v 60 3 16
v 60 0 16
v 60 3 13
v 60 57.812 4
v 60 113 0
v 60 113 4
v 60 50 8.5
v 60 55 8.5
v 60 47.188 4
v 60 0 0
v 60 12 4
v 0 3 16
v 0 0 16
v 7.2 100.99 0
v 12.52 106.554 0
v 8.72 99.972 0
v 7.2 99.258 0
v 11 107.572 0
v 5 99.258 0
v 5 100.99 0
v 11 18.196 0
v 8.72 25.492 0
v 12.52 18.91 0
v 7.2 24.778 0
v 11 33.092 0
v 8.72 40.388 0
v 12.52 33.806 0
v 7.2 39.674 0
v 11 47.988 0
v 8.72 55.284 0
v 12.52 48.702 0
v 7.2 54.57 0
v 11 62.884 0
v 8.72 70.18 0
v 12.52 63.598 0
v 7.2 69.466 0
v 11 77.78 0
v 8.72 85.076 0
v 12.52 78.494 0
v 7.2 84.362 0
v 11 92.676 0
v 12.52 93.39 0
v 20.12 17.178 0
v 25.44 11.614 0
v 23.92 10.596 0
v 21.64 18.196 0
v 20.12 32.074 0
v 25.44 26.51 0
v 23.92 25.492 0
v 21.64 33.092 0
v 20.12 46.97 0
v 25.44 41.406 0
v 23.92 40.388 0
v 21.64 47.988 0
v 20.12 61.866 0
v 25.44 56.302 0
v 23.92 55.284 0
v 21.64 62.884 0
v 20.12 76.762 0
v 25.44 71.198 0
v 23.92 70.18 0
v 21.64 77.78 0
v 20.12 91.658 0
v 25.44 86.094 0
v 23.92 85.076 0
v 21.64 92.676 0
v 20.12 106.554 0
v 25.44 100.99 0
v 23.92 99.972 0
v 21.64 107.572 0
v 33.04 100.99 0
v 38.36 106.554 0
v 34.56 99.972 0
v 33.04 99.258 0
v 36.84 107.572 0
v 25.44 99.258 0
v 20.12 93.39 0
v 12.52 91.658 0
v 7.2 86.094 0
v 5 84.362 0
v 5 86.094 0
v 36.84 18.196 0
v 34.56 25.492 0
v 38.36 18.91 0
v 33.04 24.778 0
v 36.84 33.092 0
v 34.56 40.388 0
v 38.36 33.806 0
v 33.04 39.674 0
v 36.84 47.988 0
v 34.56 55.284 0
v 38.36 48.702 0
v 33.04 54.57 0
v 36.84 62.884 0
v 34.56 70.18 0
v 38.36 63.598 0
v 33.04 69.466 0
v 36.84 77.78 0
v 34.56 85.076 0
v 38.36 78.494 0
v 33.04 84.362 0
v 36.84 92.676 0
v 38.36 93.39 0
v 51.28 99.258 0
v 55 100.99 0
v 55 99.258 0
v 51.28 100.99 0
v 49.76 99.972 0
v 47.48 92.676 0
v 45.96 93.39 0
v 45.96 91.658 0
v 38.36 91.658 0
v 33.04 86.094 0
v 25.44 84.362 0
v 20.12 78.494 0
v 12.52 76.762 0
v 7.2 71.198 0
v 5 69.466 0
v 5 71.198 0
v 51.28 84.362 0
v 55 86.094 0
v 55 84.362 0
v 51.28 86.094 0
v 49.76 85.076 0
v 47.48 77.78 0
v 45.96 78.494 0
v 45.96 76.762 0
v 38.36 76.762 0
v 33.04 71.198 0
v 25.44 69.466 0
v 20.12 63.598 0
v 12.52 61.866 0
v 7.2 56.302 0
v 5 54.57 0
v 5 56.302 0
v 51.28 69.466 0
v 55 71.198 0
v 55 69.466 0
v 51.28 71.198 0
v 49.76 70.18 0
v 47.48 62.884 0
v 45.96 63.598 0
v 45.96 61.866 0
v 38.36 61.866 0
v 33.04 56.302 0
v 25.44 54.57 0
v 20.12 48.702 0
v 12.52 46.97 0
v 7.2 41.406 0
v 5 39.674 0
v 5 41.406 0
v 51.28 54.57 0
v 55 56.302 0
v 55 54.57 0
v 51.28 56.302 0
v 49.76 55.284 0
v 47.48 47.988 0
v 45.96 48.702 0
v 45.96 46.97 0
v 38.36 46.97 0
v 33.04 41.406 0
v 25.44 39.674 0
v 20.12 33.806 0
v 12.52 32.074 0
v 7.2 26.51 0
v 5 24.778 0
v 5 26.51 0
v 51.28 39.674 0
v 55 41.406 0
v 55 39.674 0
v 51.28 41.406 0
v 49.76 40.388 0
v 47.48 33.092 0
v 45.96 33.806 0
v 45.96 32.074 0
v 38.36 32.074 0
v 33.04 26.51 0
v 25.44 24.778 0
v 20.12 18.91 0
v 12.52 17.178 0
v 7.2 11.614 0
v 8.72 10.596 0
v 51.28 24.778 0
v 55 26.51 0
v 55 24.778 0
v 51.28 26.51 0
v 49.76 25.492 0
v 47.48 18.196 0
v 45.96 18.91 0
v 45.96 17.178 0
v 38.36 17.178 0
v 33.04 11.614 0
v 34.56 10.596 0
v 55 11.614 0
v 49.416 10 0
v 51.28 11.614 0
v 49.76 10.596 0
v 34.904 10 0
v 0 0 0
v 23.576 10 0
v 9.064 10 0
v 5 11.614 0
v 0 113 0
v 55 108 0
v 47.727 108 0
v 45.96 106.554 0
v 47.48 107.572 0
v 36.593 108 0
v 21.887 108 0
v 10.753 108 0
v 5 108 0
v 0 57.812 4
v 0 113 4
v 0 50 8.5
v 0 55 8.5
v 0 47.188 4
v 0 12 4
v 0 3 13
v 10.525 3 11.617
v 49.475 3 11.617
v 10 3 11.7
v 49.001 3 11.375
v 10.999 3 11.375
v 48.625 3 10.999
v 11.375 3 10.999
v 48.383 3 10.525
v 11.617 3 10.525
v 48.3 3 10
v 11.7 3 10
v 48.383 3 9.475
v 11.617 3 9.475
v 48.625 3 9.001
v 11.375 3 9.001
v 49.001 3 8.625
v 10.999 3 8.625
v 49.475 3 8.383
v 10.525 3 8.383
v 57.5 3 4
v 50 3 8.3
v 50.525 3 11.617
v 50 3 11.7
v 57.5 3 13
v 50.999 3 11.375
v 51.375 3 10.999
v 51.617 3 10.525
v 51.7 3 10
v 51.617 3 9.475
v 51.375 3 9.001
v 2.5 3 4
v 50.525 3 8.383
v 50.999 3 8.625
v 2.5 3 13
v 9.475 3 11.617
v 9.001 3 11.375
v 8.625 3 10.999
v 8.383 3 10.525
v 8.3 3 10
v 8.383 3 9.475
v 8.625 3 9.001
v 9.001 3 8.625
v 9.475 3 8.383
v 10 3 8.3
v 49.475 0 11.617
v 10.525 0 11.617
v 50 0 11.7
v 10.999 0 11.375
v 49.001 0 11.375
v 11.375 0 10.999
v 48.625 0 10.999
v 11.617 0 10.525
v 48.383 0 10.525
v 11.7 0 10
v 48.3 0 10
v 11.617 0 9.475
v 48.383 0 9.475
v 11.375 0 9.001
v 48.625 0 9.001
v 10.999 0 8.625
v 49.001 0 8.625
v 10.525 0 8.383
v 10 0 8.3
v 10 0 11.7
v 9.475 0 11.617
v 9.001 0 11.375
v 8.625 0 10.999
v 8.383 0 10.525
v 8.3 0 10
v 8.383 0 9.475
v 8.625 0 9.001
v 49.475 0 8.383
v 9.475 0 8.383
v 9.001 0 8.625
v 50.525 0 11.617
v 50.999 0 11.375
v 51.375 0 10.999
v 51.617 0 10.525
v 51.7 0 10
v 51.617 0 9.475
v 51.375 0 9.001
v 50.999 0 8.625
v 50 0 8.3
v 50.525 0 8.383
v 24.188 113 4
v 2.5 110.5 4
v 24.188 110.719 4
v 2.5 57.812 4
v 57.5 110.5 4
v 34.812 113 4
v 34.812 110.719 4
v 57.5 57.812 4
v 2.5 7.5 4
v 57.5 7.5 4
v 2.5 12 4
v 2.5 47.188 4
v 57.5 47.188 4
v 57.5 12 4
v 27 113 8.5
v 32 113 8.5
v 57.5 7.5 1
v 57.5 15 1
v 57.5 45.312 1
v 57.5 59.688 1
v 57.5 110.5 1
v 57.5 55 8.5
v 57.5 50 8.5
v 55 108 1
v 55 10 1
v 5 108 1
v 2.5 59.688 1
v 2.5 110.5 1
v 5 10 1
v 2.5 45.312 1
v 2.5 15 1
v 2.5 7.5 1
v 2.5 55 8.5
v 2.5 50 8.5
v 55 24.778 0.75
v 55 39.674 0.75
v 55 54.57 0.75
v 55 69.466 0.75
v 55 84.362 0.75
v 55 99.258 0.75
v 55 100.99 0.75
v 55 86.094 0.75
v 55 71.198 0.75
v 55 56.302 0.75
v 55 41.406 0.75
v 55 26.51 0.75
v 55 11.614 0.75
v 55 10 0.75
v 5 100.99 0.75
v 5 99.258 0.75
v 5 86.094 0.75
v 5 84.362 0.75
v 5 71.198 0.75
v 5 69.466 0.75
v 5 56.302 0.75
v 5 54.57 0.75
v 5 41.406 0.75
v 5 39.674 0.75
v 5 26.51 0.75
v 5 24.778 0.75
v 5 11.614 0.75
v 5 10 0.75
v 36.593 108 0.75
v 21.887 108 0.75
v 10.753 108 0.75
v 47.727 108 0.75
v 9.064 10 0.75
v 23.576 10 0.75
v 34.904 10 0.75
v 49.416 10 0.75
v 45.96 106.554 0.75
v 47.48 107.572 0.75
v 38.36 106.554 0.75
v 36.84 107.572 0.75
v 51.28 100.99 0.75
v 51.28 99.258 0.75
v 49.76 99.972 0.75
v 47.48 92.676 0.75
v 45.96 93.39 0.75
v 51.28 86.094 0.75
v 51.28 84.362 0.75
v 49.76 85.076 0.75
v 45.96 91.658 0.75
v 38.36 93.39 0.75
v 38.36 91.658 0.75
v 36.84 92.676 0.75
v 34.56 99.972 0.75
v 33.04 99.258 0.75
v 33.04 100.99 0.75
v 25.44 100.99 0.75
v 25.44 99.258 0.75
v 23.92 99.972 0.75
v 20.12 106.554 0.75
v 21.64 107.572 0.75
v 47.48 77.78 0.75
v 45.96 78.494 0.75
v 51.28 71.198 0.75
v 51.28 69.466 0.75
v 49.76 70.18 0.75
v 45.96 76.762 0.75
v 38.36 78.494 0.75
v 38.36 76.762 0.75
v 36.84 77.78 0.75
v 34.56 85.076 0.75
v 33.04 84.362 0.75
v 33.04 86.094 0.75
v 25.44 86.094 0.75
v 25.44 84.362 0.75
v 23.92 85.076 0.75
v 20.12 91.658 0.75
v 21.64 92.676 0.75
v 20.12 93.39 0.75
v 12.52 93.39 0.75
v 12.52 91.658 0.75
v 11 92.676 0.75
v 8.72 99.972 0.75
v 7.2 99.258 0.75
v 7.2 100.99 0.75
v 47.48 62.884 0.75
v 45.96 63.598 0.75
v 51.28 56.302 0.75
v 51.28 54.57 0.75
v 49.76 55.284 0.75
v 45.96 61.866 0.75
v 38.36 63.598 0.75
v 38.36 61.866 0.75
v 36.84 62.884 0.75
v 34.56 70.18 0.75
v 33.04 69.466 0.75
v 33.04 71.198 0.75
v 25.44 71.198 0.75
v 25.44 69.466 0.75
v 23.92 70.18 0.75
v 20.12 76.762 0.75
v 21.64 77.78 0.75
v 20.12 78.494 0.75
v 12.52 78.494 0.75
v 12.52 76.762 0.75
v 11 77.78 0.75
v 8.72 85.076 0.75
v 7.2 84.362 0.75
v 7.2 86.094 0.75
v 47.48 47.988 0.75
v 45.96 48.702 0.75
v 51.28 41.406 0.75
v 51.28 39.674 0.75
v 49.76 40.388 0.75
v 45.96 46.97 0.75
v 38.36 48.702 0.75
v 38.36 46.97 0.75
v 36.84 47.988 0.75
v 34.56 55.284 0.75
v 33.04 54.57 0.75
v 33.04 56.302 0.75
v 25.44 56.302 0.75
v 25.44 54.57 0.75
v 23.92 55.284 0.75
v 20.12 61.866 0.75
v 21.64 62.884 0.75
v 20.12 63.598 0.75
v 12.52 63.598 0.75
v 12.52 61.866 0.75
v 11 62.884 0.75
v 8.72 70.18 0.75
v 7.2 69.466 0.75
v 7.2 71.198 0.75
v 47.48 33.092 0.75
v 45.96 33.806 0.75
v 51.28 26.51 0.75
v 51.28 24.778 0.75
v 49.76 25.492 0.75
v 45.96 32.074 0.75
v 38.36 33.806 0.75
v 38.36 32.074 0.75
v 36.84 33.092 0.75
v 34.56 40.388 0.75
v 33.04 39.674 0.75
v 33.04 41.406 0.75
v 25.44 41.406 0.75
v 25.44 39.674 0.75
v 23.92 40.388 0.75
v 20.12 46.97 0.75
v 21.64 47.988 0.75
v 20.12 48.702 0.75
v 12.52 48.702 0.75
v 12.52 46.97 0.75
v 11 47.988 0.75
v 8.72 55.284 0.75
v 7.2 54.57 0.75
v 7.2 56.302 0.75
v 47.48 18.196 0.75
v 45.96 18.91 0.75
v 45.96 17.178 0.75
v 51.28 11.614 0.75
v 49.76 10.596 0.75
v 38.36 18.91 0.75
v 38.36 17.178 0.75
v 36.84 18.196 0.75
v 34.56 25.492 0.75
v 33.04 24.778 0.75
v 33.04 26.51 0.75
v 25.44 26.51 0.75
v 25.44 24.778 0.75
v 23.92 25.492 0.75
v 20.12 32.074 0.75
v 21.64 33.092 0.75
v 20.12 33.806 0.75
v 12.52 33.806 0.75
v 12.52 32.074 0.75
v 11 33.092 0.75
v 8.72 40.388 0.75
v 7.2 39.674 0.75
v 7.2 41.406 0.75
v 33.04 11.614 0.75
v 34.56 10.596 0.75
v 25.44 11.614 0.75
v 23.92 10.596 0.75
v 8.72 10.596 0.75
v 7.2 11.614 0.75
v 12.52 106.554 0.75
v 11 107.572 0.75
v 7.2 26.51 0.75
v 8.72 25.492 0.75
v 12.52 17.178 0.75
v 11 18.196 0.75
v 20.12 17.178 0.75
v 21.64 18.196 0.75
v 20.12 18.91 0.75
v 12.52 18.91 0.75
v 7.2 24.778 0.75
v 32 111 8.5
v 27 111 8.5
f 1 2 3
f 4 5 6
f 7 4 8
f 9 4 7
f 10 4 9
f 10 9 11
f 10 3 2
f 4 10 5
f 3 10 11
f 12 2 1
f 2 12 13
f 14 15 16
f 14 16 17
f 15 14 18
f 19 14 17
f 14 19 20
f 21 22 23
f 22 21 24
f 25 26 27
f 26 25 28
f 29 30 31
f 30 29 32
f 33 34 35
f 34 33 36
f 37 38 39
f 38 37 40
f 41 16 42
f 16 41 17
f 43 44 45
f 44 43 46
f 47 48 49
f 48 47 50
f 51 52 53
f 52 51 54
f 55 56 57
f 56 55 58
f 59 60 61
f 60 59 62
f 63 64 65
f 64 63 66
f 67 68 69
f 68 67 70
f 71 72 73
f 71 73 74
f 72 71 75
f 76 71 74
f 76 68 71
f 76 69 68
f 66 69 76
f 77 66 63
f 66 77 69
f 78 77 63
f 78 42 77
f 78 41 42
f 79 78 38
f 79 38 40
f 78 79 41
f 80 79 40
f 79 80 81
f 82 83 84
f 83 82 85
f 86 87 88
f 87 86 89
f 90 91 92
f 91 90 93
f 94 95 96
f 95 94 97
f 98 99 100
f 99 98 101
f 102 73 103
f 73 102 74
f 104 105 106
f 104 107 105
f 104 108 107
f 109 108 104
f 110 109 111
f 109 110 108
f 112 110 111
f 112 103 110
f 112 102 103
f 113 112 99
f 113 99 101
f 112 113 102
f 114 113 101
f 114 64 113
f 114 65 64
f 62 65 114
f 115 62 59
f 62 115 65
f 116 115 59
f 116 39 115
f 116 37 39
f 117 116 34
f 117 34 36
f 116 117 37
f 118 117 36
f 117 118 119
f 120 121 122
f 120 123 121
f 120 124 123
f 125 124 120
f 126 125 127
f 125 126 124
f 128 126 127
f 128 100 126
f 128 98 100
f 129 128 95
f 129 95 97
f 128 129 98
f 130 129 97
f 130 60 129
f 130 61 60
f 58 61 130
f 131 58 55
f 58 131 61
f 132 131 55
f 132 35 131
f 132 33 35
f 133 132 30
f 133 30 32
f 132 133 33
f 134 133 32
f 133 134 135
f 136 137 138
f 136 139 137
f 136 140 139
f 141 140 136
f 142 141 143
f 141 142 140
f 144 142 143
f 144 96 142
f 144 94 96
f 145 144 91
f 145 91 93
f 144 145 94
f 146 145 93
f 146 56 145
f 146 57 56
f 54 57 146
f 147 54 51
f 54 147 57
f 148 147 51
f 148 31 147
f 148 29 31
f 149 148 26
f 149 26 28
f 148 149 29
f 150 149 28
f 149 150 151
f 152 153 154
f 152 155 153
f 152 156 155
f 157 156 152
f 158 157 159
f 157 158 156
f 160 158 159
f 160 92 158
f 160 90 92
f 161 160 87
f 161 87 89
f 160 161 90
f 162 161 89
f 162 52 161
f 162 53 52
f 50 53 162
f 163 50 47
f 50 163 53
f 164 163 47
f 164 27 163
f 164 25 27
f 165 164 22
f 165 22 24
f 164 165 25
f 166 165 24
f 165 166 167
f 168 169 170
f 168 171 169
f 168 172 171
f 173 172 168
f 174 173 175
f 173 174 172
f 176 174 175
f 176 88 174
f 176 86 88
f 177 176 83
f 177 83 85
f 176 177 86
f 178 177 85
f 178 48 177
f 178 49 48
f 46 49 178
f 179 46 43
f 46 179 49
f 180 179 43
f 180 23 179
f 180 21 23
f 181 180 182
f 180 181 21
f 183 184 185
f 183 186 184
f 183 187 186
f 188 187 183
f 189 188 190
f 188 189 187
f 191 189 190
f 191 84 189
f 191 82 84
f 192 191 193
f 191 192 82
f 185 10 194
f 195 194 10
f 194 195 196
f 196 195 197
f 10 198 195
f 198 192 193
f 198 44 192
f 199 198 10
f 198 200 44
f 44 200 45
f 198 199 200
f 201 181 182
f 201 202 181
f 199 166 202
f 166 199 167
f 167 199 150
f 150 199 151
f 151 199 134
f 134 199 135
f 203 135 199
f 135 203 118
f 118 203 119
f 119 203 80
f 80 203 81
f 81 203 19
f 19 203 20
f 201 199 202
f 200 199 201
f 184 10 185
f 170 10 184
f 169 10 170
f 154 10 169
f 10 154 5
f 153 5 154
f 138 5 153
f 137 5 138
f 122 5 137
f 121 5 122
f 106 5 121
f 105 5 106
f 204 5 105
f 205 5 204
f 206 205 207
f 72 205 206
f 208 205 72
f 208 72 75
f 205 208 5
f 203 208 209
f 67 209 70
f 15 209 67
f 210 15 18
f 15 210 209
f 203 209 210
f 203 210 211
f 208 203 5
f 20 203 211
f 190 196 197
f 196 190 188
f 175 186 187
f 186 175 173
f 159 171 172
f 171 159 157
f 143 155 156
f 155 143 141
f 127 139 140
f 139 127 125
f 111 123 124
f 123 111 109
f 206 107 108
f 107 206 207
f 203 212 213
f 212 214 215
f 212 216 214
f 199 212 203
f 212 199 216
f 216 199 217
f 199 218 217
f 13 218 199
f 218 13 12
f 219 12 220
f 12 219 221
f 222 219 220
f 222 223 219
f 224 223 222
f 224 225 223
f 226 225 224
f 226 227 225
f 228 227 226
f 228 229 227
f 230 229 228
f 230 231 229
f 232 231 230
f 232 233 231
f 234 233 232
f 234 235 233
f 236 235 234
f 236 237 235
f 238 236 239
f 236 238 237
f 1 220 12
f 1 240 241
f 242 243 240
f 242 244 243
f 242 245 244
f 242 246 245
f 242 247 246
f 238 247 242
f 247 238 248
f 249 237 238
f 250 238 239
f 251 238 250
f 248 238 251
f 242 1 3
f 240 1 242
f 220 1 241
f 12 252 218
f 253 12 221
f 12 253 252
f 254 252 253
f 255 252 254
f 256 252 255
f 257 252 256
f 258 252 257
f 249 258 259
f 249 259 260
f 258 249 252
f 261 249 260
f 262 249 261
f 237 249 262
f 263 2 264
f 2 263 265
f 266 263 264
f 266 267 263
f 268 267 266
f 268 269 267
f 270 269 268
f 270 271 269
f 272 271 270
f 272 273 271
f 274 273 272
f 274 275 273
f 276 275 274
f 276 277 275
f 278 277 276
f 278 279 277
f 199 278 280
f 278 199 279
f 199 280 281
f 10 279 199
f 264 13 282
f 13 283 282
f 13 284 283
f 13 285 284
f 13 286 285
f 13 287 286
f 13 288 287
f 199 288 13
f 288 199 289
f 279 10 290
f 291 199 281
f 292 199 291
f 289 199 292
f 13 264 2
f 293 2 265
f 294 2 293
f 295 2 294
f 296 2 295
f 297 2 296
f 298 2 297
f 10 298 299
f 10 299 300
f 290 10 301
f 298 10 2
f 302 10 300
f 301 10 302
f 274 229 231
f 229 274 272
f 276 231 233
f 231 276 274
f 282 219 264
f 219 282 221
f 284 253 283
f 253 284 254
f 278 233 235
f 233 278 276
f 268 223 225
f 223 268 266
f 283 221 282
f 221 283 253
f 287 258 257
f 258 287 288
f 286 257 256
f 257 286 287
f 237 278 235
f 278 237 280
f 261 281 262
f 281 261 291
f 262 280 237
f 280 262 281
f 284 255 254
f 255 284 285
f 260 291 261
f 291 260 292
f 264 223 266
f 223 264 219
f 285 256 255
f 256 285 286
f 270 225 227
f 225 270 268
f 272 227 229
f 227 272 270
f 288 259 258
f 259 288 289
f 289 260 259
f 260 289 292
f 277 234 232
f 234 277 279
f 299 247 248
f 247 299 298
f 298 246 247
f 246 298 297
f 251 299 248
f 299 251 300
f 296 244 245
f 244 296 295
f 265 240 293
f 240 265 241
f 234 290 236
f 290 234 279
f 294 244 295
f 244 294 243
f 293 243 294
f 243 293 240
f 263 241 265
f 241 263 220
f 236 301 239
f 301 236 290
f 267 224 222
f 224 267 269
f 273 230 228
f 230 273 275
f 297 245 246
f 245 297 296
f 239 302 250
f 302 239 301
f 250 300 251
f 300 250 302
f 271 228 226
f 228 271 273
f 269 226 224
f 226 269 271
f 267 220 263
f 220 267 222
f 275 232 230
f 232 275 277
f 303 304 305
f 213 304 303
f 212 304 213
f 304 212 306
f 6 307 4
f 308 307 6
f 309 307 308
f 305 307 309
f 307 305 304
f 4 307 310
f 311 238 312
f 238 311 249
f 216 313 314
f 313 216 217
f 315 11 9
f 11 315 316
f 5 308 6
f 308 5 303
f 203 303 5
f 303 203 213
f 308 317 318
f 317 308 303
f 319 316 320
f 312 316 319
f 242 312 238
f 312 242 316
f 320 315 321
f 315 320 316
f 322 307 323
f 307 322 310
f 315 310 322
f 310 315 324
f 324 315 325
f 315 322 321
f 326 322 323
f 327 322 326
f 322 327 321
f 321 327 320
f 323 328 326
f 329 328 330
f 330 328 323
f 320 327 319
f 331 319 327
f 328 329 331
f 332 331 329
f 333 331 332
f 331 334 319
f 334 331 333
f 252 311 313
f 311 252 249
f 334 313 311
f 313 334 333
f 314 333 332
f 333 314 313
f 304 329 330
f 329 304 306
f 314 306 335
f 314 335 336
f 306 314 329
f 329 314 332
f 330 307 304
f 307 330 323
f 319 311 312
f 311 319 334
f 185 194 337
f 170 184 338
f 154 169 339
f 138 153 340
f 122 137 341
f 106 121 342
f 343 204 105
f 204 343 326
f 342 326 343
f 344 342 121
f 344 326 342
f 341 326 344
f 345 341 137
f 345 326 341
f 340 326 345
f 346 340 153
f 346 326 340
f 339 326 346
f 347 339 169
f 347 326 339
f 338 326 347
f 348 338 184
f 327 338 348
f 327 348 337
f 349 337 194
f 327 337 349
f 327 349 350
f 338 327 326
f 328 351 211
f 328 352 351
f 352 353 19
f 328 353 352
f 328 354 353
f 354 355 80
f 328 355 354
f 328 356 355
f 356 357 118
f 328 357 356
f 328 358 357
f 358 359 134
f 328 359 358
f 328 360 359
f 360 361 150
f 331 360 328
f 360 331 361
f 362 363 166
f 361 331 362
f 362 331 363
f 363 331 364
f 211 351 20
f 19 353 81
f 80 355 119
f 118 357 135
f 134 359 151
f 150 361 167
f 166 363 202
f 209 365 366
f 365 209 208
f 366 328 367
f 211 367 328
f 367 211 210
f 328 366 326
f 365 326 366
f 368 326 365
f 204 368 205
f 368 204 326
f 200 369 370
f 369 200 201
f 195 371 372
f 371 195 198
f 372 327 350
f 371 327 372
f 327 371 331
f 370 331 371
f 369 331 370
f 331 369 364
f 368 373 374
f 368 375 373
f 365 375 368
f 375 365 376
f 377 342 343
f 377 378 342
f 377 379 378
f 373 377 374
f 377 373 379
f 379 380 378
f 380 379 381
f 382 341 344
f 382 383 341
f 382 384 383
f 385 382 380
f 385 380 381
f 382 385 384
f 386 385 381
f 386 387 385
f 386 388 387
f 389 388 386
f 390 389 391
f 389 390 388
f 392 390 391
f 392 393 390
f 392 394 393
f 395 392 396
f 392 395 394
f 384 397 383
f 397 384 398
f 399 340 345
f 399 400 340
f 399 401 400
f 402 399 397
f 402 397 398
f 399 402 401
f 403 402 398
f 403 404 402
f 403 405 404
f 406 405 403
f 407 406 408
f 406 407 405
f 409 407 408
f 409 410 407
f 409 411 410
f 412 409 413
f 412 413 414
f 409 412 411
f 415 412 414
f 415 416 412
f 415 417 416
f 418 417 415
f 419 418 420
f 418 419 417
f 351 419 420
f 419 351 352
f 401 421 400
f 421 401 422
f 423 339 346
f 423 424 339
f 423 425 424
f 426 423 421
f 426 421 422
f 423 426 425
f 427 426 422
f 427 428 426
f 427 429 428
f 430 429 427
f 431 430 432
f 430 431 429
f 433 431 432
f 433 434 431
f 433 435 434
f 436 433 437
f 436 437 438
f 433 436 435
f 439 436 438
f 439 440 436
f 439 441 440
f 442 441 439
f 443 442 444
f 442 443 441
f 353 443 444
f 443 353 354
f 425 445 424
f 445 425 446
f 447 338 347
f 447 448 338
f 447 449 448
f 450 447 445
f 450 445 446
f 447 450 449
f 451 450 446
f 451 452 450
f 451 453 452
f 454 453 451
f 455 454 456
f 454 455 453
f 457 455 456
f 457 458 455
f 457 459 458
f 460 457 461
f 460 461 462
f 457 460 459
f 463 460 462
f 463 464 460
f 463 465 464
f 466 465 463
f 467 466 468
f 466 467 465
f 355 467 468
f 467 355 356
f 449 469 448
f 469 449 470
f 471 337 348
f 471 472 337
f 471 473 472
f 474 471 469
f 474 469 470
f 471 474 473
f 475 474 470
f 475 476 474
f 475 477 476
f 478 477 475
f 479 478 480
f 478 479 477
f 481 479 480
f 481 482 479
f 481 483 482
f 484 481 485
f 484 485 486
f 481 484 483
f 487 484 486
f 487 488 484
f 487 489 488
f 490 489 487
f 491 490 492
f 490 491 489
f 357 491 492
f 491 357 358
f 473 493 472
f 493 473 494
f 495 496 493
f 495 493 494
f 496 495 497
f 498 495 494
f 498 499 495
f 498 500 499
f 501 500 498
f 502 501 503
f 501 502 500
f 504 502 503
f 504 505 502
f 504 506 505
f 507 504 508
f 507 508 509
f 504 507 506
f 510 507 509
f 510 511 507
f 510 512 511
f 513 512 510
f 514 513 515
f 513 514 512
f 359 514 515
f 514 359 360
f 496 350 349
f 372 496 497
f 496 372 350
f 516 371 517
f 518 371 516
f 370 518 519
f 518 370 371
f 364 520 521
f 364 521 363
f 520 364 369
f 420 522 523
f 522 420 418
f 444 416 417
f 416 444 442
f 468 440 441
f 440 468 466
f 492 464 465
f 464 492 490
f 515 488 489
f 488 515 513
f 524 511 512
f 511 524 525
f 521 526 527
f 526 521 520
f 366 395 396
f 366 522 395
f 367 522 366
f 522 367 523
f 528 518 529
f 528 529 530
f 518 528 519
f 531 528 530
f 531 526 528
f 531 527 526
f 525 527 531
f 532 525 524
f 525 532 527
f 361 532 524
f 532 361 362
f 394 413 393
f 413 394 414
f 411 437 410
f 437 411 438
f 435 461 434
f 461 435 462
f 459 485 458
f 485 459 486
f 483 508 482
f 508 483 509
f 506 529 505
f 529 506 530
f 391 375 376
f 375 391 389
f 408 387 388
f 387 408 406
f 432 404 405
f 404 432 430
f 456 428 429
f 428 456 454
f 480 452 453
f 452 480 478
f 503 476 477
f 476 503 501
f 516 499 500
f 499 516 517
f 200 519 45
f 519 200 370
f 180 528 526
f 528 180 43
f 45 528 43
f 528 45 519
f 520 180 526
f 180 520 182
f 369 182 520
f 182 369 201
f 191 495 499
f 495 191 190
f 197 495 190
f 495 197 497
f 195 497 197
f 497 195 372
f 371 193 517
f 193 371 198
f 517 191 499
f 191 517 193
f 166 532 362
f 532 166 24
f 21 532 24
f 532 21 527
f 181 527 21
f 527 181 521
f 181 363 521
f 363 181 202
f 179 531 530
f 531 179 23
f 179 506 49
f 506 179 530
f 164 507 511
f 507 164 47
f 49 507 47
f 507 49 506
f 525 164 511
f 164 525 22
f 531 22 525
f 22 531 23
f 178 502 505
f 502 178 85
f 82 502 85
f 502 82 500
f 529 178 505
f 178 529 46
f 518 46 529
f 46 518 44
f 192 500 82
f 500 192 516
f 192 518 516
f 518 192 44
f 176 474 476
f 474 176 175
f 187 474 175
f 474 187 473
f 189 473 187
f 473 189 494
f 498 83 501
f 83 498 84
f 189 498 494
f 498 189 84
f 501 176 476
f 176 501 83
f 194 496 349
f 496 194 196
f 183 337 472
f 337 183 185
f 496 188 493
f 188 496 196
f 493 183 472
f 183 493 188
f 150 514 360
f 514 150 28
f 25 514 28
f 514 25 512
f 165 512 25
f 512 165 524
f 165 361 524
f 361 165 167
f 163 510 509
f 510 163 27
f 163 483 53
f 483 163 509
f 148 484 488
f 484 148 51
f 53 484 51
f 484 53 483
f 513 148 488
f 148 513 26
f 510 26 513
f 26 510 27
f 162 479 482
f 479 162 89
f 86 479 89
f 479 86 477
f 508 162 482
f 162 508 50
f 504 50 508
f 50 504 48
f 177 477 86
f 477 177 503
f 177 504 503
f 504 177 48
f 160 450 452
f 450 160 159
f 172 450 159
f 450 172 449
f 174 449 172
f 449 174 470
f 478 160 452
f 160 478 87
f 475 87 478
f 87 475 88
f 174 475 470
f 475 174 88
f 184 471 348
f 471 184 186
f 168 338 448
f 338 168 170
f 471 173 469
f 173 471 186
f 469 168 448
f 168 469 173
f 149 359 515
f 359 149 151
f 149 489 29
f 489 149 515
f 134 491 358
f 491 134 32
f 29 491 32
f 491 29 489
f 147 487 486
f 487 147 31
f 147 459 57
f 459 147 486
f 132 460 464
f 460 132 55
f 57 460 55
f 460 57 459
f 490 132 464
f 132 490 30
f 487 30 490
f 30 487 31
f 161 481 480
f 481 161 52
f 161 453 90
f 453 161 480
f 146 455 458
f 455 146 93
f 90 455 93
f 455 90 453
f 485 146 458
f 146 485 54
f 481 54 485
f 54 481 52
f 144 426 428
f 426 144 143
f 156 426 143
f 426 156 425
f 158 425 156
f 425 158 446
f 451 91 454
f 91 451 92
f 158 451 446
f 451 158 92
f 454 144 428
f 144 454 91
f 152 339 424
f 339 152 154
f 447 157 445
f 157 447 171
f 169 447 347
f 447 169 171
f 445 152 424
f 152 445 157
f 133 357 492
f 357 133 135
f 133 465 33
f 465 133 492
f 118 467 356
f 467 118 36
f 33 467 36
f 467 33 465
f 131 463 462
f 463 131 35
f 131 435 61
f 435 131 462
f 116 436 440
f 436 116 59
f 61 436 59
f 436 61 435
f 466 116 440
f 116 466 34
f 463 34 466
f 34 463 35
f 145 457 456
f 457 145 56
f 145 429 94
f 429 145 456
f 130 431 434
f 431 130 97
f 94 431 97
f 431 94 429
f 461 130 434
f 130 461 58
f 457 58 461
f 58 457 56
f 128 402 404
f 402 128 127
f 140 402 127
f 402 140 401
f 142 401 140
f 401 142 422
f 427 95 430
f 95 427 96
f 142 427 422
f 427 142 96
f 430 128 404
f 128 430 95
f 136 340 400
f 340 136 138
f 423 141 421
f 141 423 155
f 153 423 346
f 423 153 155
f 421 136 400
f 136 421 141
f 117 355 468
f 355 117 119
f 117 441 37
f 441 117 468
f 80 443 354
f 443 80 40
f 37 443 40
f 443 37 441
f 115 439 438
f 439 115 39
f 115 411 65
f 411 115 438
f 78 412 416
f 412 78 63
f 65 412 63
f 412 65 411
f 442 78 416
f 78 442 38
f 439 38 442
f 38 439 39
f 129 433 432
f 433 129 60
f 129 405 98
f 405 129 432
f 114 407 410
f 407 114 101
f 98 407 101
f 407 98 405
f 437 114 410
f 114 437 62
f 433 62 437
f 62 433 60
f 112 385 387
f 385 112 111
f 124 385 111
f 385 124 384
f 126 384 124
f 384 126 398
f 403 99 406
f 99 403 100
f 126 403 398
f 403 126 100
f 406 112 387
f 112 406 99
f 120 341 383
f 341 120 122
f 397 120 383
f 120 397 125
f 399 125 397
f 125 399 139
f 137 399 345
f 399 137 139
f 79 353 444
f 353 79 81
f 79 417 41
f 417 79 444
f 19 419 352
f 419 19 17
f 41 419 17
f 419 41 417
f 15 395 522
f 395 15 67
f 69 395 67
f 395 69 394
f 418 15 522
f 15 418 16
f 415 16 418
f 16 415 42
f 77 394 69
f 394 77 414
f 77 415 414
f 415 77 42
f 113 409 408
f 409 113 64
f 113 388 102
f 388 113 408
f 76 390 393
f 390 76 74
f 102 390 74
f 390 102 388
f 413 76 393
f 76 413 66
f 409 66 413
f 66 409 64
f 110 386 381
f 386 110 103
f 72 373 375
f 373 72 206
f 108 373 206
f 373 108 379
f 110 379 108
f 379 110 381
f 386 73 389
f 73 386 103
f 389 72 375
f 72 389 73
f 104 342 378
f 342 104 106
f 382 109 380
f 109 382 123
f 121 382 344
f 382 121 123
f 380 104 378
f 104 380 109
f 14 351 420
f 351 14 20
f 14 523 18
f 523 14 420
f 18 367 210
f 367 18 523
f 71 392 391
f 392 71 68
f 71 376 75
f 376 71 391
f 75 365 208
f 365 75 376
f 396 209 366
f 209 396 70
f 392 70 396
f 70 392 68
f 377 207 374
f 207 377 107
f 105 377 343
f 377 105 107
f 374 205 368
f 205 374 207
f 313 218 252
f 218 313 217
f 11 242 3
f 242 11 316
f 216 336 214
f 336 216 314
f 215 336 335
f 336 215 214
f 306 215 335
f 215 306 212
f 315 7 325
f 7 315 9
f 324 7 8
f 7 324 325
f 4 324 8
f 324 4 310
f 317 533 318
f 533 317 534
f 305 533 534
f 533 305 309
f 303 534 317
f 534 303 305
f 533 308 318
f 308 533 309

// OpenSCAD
$fn=20;

module beehome (w,l,h,s){
difference (){
		cube([w,l,h]);
#	translate([(w%s)/2,(l%s)/2,0]){
		for ( j = [0 : s*1.96 : l] )	{
			for ( i = [0 : s*3.4 : w] )	{
				translate([i,j,0])cylinder (h,s,s,$fn=6);
				translate([i+s*1.7,j+s*0.96,0])cylinder (h,s,s,$fn=6);
			}
		}		
	}
}
}


module arm (){
	hull() {
		cube ([2.5,1,15]);
		cube ([2.5,15,1]);
	}
}

module arduino() {
 difference () {
		cube ([54,102,2]);
		translate ([2.5,15,0]) cylinder(10,1.5,1.5);
		translate ([2.5,90,0]) cylinder(10,1.5,1.5);
		translate ([18,46,0]) cylinder(10,1.5,1.5);
		translate ([46,46,0]) cylinder(10,1.5,1.5);
		translate ([51,15,0]) cylinder(10,1.5,1.5);
		translate ([51,96,0]) cylinder(10,1.5,1.5);
	}
}




difference () {
	cube ([60,3,16]);
#	translate([10,-1,10])rotate([-90,0,0]) cylinder(5,1.7,1.7);
#	translate([50,-1,10])rotate([-90,0,0]) cylinder(5,1.7,1.7);
}


translate ([0,0,0])arm ();
translate ([57.5,0,0])arm ();

difference () {
	cube ([60,113,4]);
#	translate([2.5,7.5,1])cube ([55,103,4]);
	translate([5,10,0])cube ([50,98,4]);
}
//conner
#translate ([0,50,0])hull() {
		translate([0,-5,0])cube ([2.5,15,0.5]);
		translate([0,0,8])cube ([2.5,5,0.5]);
}
#translate ([57.5,50,0])hull() {
		translate([0,-5,0])cube ([2.5,15,0.5]);
		translate([0,0,8])cube ([2.5,5,0.5]);
}
translate ([27,113,0])rotate([0,0,-90])hull() {
		translate([0,-5,0])cube ([2.5,15,0.5]);
		translate([0,0,8])cube ([2,5,0.5]);
}


//bottom beehome
beehome (60,113,0.75,7.6);



// color ("green")translate([3,8,4])  arduino();
